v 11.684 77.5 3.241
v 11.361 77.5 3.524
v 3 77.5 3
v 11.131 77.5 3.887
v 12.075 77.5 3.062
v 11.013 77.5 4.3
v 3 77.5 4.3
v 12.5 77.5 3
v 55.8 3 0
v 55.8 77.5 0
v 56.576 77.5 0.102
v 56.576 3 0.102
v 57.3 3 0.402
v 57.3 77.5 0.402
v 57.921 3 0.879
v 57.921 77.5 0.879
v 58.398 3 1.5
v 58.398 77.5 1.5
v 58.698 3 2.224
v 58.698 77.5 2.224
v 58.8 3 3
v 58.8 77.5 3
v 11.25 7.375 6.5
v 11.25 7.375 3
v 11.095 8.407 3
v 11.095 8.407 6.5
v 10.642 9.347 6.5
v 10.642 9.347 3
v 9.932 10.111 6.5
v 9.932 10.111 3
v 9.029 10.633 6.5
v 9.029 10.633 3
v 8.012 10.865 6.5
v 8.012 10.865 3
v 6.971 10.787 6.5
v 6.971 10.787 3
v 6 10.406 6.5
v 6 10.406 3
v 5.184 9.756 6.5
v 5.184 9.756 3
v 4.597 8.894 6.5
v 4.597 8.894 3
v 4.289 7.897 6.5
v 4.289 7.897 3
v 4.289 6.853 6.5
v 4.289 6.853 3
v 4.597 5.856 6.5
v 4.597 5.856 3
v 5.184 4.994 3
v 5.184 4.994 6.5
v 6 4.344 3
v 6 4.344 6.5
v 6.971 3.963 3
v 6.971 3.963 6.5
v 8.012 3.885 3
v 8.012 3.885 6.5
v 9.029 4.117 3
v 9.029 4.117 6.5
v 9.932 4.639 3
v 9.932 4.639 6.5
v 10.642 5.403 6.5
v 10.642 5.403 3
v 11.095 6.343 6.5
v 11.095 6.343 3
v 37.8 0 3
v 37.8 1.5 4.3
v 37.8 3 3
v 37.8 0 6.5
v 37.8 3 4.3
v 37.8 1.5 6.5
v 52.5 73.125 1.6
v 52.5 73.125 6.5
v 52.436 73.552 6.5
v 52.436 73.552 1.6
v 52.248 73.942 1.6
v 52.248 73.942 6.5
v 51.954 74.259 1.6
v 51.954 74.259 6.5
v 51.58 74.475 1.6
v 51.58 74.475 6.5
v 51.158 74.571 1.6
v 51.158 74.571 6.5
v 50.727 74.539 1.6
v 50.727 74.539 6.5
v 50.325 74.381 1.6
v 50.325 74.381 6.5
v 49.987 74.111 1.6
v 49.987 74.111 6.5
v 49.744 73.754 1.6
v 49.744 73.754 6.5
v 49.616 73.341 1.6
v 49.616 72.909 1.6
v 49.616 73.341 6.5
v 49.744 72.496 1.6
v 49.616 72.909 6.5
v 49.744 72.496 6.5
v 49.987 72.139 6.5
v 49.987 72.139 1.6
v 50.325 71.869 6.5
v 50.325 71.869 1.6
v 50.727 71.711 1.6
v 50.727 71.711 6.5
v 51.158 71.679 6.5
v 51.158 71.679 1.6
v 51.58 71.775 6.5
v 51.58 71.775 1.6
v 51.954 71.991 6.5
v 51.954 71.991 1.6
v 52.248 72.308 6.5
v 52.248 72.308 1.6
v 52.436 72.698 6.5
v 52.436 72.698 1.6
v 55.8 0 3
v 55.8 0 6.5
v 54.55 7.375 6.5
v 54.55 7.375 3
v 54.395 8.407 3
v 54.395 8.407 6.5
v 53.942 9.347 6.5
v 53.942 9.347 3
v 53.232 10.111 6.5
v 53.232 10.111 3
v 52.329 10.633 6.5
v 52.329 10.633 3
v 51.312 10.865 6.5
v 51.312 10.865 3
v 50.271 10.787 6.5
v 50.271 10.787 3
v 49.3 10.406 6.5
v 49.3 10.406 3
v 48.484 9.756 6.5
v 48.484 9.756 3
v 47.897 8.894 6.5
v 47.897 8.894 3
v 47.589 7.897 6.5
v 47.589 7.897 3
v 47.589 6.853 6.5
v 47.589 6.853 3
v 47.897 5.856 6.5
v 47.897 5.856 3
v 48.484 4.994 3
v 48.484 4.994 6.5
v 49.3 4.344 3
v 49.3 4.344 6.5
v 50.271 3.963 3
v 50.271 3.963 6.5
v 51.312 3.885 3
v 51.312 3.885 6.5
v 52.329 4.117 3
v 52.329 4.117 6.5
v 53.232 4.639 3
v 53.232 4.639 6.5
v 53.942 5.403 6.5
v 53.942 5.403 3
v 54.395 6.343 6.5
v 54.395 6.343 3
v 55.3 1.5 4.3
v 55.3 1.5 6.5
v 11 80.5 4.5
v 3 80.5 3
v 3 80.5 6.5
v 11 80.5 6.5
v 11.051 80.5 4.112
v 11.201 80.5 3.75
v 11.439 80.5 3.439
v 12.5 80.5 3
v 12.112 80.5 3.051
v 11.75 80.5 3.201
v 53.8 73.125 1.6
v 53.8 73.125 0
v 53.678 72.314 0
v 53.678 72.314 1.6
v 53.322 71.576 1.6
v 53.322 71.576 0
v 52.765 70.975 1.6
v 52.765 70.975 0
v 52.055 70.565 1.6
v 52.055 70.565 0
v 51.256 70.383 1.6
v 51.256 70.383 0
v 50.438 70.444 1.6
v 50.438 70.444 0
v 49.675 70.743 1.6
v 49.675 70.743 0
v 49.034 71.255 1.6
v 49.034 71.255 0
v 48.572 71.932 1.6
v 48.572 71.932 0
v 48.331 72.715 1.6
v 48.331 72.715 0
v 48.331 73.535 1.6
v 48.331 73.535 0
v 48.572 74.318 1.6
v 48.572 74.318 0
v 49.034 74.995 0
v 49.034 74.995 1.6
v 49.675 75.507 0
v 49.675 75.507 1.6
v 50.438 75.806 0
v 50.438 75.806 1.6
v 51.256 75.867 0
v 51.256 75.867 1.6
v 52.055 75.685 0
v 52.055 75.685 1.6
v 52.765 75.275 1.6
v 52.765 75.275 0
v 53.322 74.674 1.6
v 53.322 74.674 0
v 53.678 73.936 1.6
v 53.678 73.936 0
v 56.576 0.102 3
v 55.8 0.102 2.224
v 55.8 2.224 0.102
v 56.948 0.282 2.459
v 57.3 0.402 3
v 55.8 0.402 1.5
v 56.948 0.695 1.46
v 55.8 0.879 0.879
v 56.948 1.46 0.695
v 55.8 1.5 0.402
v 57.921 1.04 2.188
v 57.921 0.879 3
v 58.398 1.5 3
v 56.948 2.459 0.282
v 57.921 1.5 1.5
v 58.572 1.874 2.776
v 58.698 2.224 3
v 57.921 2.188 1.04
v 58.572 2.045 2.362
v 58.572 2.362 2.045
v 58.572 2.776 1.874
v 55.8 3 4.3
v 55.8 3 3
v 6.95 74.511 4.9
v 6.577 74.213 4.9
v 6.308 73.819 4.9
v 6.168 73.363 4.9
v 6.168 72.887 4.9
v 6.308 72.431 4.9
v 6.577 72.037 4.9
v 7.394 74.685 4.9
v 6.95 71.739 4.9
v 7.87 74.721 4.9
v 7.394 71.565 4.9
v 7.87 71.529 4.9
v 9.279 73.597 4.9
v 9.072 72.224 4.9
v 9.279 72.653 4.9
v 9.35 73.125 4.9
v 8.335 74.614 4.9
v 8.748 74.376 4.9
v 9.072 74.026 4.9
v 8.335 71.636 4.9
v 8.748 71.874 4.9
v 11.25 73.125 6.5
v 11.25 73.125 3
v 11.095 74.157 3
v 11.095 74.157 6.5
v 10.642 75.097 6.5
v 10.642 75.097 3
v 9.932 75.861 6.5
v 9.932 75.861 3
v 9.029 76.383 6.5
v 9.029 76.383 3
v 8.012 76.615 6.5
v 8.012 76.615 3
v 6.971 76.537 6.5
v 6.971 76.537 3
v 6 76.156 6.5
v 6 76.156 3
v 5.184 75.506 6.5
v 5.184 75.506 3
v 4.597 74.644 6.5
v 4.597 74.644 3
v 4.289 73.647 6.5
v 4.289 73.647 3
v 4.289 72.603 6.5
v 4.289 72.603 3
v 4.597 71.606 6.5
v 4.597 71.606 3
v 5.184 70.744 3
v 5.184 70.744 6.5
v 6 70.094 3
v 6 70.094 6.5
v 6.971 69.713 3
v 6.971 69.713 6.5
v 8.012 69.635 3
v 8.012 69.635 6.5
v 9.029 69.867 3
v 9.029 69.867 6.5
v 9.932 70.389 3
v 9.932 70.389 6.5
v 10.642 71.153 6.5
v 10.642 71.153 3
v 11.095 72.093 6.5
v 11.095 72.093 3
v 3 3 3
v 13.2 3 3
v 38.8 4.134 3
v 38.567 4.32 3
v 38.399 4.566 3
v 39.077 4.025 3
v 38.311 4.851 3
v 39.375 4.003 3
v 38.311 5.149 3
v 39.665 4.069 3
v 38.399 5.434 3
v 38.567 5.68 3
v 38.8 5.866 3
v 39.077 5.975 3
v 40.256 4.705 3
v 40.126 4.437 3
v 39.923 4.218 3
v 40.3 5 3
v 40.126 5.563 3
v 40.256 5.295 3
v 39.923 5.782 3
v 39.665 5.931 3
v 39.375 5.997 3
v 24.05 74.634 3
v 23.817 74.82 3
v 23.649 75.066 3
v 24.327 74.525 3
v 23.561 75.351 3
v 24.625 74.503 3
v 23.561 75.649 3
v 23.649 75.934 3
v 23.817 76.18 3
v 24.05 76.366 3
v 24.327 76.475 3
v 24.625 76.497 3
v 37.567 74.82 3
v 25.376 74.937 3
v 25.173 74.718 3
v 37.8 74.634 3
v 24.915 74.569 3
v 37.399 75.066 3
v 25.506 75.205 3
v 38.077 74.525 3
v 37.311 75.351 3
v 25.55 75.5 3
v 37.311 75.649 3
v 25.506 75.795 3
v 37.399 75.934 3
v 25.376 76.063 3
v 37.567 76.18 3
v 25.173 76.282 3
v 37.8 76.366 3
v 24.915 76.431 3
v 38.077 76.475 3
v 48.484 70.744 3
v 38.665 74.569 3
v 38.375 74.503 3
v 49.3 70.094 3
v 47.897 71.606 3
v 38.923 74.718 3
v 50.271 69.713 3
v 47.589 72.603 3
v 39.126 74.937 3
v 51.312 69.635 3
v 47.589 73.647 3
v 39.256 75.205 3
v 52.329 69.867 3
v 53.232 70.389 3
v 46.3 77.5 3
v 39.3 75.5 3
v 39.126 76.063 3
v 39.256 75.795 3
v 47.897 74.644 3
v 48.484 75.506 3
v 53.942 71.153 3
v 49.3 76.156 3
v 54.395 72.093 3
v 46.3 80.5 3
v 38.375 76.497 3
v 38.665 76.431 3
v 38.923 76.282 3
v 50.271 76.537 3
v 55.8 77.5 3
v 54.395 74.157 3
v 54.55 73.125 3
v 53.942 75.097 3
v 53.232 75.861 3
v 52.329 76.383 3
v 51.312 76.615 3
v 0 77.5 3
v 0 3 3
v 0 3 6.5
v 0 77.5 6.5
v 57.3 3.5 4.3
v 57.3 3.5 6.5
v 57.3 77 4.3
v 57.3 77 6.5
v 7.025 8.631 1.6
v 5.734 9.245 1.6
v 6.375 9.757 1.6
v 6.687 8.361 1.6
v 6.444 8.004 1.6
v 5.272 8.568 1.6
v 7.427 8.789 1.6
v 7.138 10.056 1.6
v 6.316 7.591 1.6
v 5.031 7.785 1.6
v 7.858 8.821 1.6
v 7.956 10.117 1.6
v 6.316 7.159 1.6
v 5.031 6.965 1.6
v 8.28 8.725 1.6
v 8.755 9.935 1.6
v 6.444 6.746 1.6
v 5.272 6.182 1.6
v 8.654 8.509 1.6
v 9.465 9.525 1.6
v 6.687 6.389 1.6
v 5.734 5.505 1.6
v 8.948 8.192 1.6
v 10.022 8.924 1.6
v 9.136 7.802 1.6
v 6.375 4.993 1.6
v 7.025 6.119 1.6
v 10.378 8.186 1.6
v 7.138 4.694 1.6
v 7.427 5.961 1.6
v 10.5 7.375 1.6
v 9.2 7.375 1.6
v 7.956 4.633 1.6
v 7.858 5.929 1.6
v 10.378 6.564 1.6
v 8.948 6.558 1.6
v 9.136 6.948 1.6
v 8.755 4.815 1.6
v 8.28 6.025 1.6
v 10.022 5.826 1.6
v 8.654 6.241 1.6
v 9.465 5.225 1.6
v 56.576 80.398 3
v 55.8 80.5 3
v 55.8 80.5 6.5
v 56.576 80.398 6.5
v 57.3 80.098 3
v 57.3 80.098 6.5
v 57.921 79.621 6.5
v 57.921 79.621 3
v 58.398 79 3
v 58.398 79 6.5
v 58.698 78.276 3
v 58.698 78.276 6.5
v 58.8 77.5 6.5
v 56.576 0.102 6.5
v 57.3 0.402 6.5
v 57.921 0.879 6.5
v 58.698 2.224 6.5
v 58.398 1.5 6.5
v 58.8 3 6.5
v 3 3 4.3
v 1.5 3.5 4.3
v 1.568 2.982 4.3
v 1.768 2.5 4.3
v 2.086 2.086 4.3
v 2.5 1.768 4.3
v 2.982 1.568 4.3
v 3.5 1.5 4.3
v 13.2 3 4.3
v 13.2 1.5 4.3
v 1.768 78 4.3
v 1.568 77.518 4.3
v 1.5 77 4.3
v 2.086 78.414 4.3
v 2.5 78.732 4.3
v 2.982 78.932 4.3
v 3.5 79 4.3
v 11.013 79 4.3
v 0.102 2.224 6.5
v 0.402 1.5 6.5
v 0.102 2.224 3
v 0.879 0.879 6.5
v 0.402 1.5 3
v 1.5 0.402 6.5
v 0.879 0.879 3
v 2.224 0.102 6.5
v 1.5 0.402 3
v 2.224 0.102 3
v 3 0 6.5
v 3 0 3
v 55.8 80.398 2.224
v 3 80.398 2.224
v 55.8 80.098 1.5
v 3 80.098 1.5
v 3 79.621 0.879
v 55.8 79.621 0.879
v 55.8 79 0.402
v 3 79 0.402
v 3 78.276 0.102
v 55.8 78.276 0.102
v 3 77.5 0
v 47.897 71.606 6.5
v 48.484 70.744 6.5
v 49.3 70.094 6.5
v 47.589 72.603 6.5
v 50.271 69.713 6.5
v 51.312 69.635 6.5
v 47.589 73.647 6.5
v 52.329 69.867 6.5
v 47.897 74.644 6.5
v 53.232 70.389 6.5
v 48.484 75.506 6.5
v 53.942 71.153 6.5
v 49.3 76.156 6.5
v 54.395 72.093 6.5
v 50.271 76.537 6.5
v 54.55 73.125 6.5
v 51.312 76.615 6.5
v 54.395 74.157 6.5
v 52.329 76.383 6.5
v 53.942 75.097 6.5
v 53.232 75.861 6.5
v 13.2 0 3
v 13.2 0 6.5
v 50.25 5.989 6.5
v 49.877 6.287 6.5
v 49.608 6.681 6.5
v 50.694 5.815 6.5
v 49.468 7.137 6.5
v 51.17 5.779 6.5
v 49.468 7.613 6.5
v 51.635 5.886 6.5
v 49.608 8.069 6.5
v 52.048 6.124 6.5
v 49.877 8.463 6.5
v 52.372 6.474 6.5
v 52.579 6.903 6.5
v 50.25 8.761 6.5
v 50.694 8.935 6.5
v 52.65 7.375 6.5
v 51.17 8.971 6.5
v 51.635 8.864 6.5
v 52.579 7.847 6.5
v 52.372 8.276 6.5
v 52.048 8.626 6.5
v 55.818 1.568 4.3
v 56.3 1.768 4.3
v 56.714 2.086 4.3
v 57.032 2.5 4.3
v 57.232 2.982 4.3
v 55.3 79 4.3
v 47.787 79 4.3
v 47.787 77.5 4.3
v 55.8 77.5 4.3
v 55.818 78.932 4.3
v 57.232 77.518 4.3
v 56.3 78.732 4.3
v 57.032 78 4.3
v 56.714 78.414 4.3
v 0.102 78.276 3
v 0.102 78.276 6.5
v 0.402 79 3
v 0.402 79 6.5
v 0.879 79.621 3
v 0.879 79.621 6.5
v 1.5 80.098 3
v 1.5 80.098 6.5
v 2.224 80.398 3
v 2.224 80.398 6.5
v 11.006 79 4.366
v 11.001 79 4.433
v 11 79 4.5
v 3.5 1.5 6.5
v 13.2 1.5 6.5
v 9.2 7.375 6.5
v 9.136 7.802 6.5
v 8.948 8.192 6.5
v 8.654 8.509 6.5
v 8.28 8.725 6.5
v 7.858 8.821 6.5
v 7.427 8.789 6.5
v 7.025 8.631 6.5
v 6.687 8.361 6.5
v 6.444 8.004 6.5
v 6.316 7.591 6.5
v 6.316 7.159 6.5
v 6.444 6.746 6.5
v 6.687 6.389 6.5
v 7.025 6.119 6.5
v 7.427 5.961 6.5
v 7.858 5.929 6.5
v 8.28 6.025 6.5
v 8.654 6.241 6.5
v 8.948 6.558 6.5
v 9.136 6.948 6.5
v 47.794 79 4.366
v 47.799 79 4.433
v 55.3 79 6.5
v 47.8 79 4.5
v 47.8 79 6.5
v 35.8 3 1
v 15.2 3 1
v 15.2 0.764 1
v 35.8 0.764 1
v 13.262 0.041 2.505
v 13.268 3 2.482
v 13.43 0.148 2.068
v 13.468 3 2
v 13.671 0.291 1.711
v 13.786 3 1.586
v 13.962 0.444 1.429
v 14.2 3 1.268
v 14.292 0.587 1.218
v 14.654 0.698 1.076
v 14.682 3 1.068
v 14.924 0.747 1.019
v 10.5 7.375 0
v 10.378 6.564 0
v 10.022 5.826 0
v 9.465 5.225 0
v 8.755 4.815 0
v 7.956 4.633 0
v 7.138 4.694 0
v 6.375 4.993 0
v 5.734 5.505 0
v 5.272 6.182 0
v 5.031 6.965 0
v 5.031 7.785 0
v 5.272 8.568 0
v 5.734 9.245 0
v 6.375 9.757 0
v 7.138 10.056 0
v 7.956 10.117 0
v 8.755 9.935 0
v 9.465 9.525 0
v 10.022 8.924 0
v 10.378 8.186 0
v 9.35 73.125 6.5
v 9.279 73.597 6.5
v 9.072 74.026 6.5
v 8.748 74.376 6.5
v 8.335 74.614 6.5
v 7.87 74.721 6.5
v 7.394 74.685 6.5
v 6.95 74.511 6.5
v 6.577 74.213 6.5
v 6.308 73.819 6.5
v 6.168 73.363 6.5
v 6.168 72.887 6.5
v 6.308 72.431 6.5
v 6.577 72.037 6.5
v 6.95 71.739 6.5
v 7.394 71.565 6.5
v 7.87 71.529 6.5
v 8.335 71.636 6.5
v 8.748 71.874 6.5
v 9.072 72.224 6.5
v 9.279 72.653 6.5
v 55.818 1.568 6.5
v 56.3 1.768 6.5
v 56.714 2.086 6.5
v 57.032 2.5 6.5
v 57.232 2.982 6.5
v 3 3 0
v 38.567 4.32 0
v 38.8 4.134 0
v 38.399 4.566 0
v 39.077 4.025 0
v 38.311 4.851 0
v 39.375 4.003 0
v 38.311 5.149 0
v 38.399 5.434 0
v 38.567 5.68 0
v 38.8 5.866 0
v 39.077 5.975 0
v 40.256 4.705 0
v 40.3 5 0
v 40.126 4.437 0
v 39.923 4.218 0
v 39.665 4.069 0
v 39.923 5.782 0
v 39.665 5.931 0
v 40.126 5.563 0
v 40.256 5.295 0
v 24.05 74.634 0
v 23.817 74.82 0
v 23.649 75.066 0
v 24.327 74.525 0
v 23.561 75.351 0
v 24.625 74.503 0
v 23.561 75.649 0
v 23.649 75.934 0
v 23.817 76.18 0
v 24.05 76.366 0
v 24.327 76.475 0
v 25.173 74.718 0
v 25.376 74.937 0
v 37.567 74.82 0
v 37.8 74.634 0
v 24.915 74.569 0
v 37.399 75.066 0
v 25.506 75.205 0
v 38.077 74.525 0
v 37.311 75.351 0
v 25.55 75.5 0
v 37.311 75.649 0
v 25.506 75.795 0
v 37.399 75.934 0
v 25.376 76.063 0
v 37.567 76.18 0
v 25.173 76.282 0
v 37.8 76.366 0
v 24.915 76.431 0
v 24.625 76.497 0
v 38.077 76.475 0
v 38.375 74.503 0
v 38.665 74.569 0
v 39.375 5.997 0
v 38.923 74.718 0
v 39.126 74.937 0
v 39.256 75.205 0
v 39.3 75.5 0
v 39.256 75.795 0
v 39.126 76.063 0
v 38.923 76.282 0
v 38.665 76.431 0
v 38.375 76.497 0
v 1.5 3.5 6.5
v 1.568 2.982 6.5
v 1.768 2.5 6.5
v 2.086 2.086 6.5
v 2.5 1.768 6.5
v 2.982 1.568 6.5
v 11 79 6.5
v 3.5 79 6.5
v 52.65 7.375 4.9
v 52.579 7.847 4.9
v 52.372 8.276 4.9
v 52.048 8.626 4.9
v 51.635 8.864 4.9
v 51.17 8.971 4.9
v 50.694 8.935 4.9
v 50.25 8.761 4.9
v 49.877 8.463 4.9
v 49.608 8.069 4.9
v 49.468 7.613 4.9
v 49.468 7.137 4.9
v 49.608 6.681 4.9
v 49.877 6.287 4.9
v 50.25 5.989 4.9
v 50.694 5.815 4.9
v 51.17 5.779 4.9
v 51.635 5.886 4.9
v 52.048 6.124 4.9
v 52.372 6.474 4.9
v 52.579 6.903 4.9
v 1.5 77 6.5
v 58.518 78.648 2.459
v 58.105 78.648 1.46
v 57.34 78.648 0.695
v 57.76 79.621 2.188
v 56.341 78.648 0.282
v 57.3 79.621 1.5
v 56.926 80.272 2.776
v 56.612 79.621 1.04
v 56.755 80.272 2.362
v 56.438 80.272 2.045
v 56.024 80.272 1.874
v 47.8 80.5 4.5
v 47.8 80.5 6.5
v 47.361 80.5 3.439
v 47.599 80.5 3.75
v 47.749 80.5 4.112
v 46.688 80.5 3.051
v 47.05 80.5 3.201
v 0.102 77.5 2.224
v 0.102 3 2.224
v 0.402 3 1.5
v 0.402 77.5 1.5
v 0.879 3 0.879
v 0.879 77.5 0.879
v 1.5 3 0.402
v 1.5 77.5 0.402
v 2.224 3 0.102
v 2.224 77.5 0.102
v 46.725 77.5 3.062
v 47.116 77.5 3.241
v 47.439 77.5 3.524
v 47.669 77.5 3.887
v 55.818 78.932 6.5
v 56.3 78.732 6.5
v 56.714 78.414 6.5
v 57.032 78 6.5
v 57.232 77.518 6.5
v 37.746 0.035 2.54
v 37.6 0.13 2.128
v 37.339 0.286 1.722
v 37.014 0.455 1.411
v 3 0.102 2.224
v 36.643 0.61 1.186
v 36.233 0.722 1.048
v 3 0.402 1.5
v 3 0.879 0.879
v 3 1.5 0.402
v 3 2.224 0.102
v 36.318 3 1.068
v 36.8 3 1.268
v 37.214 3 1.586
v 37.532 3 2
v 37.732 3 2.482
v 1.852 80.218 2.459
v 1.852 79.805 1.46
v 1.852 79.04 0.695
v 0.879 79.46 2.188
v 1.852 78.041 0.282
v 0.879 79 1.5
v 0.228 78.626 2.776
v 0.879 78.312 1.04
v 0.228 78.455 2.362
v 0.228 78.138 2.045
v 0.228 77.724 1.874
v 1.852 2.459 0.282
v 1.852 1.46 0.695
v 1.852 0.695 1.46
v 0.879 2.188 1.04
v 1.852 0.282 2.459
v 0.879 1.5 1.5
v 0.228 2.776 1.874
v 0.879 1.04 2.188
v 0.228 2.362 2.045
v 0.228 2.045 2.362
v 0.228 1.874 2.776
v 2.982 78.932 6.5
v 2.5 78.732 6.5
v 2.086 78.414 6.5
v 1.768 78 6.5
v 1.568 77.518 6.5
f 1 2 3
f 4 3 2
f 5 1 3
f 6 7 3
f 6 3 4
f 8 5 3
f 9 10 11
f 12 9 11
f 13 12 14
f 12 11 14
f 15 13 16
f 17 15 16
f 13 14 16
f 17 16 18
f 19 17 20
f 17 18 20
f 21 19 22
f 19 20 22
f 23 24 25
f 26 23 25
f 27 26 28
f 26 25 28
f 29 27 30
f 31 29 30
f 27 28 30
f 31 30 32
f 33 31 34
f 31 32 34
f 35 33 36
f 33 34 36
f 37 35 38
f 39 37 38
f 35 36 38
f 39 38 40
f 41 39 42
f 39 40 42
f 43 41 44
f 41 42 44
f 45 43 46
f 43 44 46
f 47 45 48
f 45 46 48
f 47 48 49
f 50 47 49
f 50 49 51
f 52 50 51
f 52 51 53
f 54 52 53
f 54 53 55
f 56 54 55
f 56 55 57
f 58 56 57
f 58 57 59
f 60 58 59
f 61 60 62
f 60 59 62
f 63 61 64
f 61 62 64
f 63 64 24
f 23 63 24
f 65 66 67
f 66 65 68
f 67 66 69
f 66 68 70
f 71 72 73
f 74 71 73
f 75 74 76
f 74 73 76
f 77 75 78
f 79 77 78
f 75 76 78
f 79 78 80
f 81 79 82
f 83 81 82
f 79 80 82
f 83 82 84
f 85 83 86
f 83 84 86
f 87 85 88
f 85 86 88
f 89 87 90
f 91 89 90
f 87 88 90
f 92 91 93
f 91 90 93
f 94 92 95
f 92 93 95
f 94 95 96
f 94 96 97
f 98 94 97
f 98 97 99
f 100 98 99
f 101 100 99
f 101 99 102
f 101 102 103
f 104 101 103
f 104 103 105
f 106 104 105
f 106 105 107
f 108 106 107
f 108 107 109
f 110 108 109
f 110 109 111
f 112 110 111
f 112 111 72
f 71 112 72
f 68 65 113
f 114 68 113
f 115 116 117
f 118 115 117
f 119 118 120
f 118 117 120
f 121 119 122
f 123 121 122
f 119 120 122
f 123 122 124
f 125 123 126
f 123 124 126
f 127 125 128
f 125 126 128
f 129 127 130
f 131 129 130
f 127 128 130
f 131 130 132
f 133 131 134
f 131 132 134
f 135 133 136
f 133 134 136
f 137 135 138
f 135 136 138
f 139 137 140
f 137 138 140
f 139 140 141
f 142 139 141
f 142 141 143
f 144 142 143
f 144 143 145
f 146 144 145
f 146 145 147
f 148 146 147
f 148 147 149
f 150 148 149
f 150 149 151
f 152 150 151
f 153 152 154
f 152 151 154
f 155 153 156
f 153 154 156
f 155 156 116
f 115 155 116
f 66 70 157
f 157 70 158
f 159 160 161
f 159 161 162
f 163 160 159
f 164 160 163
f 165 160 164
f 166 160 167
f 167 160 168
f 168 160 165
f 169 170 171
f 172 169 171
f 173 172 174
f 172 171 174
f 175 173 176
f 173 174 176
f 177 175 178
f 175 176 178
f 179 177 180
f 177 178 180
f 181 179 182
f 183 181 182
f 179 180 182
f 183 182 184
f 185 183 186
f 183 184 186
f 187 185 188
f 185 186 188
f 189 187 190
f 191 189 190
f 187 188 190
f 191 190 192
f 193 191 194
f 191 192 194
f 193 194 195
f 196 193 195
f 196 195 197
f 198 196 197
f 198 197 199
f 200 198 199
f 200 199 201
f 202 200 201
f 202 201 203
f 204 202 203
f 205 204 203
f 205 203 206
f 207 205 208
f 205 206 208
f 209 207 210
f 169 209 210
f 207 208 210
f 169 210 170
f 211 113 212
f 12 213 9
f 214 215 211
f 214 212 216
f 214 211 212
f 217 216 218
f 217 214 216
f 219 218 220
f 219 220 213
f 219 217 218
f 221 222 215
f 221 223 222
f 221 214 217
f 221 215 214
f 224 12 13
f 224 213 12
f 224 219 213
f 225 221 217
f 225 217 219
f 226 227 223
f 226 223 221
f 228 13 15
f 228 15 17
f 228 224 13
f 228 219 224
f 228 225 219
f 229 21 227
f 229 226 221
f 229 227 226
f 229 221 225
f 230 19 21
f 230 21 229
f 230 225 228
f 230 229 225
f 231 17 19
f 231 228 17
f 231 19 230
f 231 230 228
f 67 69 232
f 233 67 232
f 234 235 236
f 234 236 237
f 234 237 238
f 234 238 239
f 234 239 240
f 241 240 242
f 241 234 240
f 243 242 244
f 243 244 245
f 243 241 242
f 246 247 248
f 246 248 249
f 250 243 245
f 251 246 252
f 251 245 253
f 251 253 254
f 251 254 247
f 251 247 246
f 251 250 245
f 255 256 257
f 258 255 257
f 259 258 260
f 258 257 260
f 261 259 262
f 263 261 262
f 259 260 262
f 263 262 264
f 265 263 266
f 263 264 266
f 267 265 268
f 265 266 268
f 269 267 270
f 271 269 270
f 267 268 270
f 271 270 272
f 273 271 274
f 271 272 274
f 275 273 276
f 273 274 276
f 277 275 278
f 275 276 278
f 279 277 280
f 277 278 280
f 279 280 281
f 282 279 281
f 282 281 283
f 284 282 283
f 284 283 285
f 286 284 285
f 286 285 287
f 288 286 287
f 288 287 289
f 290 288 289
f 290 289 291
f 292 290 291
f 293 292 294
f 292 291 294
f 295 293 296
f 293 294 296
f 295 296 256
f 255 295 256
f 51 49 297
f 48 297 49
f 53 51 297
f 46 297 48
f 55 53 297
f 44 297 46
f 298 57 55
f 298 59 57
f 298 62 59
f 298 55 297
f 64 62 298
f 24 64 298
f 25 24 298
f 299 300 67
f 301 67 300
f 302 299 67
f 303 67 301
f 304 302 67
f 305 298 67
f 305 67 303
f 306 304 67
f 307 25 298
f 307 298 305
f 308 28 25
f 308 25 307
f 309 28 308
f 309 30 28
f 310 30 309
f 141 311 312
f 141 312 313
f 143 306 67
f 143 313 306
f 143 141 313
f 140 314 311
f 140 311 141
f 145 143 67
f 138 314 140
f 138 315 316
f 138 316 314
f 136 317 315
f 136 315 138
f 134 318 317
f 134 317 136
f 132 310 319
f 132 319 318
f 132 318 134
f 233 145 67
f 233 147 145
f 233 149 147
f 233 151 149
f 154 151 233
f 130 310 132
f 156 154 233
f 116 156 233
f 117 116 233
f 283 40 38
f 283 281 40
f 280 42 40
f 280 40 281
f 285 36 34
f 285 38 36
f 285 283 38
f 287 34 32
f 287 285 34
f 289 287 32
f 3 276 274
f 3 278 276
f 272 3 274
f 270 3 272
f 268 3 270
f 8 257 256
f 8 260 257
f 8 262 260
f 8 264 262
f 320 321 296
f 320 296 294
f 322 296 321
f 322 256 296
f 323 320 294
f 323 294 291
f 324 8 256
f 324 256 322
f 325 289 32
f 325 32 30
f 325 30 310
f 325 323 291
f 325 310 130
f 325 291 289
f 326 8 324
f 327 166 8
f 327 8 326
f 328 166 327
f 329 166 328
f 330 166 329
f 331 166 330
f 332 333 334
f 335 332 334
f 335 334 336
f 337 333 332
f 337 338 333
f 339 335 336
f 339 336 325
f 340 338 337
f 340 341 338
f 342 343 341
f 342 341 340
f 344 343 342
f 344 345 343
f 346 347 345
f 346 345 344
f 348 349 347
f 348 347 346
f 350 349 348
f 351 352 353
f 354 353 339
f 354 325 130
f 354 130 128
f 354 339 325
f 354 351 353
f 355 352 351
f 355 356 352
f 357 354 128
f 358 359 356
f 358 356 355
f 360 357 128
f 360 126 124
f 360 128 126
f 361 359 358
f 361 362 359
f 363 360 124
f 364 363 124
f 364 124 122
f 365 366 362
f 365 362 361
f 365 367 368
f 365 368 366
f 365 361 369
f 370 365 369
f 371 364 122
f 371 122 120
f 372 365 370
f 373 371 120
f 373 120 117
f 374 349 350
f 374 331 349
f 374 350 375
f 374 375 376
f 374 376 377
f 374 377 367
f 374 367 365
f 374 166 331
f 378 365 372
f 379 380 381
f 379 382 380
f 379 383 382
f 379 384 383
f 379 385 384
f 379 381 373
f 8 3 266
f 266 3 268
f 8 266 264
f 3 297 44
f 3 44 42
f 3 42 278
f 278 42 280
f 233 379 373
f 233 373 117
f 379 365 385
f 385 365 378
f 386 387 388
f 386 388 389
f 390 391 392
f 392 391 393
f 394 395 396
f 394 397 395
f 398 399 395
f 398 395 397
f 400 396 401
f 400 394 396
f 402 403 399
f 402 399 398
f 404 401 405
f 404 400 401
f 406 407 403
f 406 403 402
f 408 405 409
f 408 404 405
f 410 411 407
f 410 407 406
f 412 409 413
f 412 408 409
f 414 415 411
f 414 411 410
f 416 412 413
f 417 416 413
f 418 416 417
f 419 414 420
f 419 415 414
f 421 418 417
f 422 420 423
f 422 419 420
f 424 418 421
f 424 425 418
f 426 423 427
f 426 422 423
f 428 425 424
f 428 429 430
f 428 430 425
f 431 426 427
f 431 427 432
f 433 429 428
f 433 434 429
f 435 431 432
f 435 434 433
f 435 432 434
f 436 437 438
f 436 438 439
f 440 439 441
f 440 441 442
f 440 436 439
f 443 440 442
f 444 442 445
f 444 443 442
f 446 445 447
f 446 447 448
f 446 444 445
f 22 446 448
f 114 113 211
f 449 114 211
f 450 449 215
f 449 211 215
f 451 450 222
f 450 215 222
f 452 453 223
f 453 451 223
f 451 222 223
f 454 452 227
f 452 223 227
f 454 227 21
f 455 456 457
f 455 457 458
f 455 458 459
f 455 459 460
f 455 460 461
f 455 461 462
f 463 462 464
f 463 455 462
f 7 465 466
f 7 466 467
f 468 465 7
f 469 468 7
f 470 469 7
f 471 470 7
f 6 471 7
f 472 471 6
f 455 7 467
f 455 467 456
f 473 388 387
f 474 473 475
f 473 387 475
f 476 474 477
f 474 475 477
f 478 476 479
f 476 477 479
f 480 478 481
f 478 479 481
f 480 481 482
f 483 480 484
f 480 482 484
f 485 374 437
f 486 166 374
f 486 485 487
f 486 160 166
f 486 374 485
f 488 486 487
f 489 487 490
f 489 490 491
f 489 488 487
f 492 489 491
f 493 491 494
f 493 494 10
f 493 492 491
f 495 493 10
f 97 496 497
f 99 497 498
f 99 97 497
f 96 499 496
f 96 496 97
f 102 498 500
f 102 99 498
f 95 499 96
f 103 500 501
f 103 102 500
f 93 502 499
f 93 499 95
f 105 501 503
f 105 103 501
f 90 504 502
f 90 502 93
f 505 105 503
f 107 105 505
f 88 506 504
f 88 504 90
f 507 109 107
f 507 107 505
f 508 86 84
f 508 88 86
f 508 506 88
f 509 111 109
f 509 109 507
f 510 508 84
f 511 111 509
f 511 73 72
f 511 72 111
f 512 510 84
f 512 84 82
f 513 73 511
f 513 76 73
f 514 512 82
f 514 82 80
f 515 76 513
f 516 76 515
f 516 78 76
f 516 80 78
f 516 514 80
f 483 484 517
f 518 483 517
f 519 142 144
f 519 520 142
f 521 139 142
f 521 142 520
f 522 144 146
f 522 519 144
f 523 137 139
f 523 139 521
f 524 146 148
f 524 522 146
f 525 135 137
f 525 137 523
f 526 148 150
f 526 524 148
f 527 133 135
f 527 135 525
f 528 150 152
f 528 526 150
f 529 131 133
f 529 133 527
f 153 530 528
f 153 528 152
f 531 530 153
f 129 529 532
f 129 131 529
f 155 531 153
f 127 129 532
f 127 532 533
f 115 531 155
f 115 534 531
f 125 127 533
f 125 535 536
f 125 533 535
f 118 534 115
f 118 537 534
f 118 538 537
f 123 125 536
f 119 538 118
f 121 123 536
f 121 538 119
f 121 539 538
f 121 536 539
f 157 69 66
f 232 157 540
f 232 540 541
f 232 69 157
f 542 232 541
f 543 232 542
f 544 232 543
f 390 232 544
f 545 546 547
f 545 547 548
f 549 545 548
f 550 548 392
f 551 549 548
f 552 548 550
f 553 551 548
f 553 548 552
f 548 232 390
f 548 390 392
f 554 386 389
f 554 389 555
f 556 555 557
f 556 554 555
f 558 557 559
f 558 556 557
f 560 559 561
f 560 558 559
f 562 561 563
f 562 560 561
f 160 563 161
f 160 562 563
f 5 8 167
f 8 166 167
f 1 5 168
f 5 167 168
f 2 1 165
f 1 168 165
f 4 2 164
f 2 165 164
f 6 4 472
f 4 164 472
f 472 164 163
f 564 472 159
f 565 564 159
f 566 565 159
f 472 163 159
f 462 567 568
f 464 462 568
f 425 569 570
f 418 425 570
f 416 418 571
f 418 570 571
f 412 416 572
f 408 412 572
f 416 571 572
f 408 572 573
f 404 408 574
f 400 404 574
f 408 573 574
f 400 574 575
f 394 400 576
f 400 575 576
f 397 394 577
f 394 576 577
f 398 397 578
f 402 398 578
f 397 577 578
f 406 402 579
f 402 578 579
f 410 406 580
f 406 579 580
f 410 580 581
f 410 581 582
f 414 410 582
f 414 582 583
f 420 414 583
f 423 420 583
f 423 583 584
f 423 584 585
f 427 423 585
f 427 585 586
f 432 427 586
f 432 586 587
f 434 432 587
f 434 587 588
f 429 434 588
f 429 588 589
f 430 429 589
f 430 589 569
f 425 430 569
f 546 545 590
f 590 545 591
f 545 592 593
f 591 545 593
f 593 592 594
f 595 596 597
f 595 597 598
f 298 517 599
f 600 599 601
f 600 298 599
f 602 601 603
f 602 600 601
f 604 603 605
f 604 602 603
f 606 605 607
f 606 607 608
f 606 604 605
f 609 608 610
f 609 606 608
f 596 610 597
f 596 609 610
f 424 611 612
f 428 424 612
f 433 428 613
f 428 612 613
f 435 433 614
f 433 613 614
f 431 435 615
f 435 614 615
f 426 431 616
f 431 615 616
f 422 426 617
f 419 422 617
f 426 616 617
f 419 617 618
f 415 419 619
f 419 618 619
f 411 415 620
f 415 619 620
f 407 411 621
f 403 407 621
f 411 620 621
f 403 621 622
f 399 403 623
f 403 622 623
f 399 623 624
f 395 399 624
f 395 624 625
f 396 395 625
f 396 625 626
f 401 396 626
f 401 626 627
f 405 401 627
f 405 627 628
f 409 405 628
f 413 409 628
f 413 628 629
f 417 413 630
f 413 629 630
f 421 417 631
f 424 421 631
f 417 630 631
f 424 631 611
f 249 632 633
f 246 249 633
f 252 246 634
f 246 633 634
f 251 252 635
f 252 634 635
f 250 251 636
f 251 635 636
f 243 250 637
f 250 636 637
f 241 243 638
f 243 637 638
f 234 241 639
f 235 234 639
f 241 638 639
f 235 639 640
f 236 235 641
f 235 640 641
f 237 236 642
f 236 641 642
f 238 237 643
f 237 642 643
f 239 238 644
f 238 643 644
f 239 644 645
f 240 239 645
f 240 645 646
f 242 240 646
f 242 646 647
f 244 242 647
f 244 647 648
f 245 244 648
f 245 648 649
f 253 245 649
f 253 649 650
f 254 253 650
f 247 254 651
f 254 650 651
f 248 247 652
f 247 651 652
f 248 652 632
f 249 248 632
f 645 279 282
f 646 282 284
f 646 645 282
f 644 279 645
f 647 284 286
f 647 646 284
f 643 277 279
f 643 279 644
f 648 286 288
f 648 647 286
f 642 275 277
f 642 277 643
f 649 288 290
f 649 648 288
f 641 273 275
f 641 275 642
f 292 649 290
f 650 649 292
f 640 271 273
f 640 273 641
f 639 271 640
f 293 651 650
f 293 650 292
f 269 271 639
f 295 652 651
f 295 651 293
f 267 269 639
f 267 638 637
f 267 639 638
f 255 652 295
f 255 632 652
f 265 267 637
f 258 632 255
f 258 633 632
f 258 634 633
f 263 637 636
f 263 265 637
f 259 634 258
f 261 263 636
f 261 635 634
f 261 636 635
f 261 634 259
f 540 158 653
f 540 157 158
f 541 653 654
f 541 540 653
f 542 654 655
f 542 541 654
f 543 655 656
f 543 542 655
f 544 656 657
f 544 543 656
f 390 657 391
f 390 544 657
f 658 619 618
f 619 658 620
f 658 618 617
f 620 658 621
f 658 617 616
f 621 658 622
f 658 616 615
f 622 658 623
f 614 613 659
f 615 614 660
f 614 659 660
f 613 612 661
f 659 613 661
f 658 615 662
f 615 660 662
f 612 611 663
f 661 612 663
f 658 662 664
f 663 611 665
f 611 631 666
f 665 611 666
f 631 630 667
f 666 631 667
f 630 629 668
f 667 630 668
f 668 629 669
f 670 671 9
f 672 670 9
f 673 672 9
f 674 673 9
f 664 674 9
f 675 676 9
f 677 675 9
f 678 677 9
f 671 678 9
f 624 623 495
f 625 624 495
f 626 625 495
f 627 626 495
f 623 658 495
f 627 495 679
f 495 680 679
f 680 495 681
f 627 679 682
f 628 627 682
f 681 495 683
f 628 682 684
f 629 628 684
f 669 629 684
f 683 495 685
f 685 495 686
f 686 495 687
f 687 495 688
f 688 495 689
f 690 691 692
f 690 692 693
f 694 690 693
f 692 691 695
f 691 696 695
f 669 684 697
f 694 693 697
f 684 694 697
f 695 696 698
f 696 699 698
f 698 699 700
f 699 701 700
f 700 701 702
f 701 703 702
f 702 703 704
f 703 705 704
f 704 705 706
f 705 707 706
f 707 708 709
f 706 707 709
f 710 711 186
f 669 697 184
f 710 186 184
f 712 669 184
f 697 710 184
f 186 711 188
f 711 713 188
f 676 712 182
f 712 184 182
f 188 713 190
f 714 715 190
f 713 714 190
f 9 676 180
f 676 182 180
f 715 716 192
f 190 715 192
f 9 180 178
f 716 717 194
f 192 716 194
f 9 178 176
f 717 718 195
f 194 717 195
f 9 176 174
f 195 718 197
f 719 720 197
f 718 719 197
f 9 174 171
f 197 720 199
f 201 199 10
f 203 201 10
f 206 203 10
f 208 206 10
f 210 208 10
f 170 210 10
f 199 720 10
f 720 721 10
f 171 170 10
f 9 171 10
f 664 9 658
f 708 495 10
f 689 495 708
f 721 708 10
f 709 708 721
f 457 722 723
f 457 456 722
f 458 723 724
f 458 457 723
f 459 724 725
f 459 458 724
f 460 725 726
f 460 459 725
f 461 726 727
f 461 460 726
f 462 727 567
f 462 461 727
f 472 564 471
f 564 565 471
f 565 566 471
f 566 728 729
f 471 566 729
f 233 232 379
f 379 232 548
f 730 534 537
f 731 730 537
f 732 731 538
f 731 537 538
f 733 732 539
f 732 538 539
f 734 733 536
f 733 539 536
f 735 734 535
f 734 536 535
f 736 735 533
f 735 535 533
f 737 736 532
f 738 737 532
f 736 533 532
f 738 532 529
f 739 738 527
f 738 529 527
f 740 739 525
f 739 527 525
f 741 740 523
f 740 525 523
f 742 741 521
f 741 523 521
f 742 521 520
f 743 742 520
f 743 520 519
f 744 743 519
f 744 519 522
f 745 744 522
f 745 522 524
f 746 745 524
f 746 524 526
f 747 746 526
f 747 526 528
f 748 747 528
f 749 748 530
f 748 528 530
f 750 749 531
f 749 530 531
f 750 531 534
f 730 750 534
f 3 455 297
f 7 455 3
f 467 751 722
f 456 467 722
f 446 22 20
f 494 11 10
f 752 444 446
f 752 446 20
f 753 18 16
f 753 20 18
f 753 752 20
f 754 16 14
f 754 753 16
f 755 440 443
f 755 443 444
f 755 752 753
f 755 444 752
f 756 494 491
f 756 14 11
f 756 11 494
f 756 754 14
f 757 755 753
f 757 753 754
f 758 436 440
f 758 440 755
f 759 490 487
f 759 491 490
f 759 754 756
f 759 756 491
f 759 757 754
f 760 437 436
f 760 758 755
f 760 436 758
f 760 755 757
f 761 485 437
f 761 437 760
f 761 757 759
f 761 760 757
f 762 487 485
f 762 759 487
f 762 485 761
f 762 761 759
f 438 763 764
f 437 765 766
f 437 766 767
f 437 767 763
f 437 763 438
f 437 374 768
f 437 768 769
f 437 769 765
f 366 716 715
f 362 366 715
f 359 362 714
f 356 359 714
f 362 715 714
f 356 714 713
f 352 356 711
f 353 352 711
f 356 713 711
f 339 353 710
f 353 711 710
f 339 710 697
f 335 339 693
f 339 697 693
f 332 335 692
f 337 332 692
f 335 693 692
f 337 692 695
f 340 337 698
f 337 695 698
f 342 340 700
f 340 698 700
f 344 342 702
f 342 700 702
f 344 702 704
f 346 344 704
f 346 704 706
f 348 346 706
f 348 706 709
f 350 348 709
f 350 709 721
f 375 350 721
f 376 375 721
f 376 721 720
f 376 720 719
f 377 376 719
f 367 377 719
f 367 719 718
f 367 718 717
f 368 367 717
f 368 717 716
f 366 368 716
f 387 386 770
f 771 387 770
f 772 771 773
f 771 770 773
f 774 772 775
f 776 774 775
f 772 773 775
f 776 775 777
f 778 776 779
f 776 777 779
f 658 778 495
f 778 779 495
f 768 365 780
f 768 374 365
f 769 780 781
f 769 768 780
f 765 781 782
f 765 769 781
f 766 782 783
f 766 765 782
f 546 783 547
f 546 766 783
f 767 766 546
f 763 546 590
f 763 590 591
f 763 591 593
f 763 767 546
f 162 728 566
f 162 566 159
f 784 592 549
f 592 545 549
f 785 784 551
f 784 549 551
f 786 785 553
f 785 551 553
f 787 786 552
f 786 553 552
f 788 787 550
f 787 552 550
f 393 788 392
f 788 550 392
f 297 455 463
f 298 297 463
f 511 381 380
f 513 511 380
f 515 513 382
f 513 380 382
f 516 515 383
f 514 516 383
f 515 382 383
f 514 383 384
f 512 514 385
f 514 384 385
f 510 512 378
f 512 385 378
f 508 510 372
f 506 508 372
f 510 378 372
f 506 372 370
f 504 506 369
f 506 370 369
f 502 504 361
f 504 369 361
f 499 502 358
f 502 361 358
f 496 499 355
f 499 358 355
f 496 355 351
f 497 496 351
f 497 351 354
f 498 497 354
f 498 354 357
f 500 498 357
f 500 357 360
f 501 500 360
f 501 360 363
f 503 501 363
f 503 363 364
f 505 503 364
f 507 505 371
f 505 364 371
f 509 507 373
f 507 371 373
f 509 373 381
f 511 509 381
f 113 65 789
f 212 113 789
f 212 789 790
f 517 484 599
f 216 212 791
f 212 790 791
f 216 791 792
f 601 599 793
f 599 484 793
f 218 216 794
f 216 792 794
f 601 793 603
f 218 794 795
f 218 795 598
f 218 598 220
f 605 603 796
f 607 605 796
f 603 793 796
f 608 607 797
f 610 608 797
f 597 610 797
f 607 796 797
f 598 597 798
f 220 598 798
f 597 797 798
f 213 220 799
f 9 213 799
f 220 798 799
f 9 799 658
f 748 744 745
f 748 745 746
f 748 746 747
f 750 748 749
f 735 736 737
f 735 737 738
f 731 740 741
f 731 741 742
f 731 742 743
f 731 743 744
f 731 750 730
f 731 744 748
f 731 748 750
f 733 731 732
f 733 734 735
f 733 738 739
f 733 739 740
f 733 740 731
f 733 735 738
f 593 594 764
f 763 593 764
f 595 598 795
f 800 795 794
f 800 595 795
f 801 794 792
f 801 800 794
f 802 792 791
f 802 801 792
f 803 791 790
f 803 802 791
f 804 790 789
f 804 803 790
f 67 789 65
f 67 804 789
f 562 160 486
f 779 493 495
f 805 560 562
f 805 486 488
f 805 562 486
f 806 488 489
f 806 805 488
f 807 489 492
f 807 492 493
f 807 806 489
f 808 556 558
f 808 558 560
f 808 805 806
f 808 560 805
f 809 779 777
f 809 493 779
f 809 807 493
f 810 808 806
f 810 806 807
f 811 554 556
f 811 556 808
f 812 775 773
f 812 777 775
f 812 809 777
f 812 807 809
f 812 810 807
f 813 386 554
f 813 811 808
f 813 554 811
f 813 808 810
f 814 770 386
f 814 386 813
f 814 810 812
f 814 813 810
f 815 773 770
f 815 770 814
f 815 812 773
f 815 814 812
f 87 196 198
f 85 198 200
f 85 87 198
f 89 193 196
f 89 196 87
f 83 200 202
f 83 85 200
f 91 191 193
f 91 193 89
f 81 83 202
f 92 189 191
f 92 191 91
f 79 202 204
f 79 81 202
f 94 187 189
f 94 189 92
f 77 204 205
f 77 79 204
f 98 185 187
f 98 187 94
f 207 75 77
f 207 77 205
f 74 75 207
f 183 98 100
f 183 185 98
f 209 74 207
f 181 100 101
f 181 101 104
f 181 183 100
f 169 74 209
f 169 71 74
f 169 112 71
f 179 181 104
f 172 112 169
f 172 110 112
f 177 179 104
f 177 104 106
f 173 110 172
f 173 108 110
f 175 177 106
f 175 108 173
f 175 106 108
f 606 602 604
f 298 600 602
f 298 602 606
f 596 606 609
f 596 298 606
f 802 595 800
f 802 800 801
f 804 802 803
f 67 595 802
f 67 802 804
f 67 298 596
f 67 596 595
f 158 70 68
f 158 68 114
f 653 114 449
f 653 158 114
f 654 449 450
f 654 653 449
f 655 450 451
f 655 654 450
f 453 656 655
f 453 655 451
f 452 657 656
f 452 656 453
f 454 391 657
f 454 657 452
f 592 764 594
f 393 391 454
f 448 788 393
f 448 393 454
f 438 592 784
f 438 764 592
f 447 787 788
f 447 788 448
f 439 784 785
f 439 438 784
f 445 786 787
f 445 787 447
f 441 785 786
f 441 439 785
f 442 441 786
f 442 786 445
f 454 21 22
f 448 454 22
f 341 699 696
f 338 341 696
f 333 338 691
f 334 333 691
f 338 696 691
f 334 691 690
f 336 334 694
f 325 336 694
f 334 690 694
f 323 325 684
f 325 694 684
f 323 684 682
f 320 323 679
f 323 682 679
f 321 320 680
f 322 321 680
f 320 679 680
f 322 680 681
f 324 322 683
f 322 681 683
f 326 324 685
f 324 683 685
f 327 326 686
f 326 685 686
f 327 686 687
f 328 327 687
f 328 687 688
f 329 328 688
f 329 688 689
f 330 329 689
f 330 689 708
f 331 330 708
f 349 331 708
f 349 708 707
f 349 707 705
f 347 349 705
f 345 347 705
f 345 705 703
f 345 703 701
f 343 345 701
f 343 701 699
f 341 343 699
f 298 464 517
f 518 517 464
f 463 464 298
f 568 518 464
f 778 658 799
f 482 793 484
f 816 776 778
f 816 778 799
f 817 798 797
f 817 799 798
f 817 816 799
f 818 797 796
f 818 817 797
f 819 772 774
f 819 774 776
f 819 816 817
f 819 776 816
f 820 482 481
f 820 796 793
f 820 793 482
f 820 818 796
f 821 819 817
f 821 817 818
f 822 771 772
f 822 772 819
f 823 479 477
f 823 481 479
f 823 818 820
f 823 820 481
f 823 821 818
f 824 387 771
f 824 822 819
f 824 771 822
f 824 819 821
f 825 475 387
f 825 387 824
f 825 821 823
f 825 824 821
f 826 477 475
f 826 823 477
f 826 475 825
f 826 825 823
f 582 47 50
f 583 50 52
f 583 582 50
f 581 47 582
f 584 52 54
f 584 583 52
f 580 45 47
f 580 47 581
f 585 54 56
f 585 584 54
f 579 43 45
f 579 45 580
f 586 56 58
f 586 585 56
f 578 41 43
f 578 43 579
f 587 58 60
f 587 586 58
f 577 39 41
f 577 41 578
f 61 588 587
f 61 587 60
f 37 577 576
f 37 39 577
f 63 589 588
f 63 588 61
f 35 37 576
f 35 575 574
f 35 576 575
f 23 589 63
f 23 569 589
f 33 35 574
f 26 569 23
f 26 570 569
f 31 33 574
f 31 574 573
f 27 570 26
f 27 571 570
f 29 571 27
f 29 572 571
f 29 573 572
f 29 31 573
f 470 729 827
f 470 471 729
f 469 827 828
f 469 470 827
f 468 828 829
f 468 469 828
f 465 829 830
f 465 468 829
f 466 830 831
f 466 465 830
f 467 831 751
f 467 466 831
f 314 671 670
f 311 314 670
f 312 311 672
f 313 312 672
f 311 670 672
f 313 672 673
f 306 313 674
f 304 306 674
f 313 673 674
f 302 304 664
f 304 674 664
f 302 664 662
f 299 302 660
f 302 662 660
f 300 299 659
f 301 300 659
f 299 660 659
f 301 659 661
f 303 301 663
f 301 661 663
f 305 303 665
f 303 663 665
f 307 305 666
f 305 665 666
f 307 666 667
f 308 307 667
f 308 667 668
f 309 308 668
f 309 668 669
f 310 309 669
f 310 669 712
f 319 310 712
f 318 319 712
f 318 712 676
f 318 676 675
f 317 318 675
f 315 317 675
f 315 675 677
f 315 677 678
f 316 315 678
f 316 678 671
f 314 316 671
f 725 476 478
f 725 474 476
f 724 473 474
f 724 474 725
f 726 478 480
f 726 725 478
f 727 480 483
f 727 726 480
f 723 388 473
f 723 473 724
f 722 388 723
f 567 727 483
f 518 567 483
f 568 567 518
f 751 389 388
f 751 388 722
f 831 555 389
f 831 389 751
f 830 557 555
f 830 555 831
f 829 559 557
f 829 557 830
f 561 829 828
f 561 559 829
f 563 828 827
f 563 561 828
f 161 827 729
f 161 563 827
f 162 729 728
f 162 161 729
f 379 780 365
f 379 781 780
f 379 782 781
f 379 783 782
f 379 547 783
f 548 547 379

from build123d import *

# Parameters (mm, degrees)
F0_W          = 58.8
F0_H          = 80.5
F1_DEPTH      = 6.5
F2_W          = 52.8
F2_H          = 74.5
F3_DEPTH      = 3.5
F5_R          = 3.5
F6_DEPTH      = 3.5
F8_R          = 1.45
F10_R         = 1.45
F11_DEPTH     = 6.501
F9_R          = 1.6
F7_R          = 1.6
F12_DEPTH     = 1.6
F13_W         = 36.8
F13_H         = 3
F14_DEPTH     = 3.5
F15_W         = 24.6
F15_H         = 3
F16_DEPTH     = 5.5
F19_DEPTH     = 2.2
F20_R         = 1
F21_DEPTH     = 6.501
F22_T1_DEPTH  = 11
F22_T3_DEPTH  = 52.8
F22_T5_DEPTH  = 74.5
F22_S9_W      = 3
F22_S9_H      = 3
F22_T10_DEPTH = 3
F22_S15_W     = 3
F22_S15_H     = 3
F22_T16_DEPTH = 3
F22_S21_W     = 3
F22_S21_H     = 3
F22_T22_DEPTH = 3
F22_S27_W     = 3
F22_S27_H     = 3
F22_T28_DEPTH = 3
F24_R         = 2
F25_R         = 1.5
F26_R         = 2
F27_R         = 2.75
F28_DEPTH     = 1.6


# Not quite as in the source:
# - a fillet or chamfer that OpenCascade refuses, or shapes differently, is made with other operations: its cross-section is extruded or revolved along the edge and cut away or added
# - a feature of the source that left no trace in its solid (it failed there, or was rolled back) is left out


with BuildPart() as f1:
    # F0 (on Top) → F1 (new body)
    with BuildSketch(Plane.XY):
        with Locations((29.4, 40.25)):
            Rectangle(F0_W, F0_H)
    extrude(amount=F1_DEPTH)

    # F2 (on face) → F3 (cut)
    with BuildSketch(Plane.XY.offset(6.5)):
        with Locations((29.4, 40.25)):
            Rectangle(F2_W, F2_H)
    extrude(amount=-F3_DEPTH, mode=Mode.SUBTRACT)

    # F5 (on face) → F6 (join)
    with BuildSketch(Plane.XY.offset(3)):
        with Locations((7.75, 7.375)):
            Circle(F5_R)
        with Locations((7.75, 73.125)):
            Circle(F5_R)
        with Locations((51.05, 73.125)):
            Circle(F5_R)
        with Locations((51.05, 7.375)):
            Circle(F5_R)
    extrude(amount=F6_DEPTH)

    # F8 (on face) + F10 (on face) → F11 (cut, through all)
    with BuildSketch(Plane.XY.offset(6.5)):
        with Locations((51.05, 73.125)):
            Circle(F8_R)
    with BuildSketch(Plane.XY.offset(6.5)):
        with Locations((7.75, 7.375)):
            Circle(F10_R)
    extrude(amount=-F11_DEPTH, mode=Mode.SUBTRACT)

    # F9 (on face) + F7 (on face) → F12 (cut)
    with BuildSketch(Plane.XY.offset(6.5)):
        with Locations((7.75, 73.125)):
            Circle(F9_R)
    with BuildSketch(Plane.XY.offset(6.5)):
        with Locations((51.05, 7.375)):
            Circle(F7_R)
    extrude(amount=-F12_DEPTH, mode=Mode.SUBTRACT)

    # F13 (on face) → F14 (cut)
    with BuildSketch(Plane.XY.offset(6.5)):
        with Locations((29.4, 79)):
            Rectangle(F13_W, F13_H)
    extrude(amount=-F14_DEPTH, mode=Mode.SUBTRACT)

    # F15 (on face) → F16 (cut)
    with BuildSketch(Plane.XY.offset(6.5)):
        with Locations((25.5, 1.5)):
            Rectangle(F15_W, F15_H)
    extrude(amount=-F16_DEPTH, mode=Mode.SUBTRACT)

    # F17 (on face) + F18 (on face) → F19 (cut)
    with BuildSketch(Plane.XY.offset(6.5)):
        Polygon((47.8, 79), (47.8, 77.5), (55.8, 77.5), (55.8, 3), (37.8, 3), (37.8, 1.5), (57.3, 1.5), (57.3, 79), align=None)
    with BuildSketch(Plane.XY.offset(6.5)):
        Polygon((1.5, 1.5), (13.2, 1.5), (13.2, 3), (3, 3), (3, 77.5), (11, 77.5), (11, 79), (1.5, 79), align=None)
    extrude(amount=-F19_DEPTH, mode=Mode.SUBTRACT)

    # F20 (on face) → F21 (cut, through all)
    with BuildSketch(Plane(origin=(0, 0, 0), x_dir=(1, 0, 0), z_dir=(0, 0, -1))):
        with Locations((39.3, -5)):
            Circle(F20_R)
        with Locations((38.3, -75.5)):
            Circle(F20_R)
        with Locations((24.55, -75.5)):
            Circle(F20_R)
    extrude(amount=-F21_DEPTH, mode=Mode.SUBTRACT)

    # F22: fillet of radius 3 on 8 edges, made by hand

    # F22_s2 → F22_t1 (cut)
    with BuildSketch(Plane.XY.offset(3)):
        with BuildLine():
            ThreePointArc((0, 3), (0.8786796564, 0.8786796564), (3, 0))
            Line((3, 0), (0, 0))
            Line((0, 0), (0, 3))
        make_face()
        with BuildLine():
            ThreePointArc((55.8, 0), (57.9213203436, 0.8786796564), (58.8, 3))
            Line((58.8, 3), (58.8, 0))
            Line((58.8, 0), (55.8, 0))
        make_face()
        with BuildLine():
            ThreePointArc((0, 77.5), (0.8786796564, 79.6213203436), (3, 80.5))
            Line((3, 80.5), (0, 80.5))
            Line((0, 80.5), (0, 77.5))
        make_face()
        with BuildLine():
            ThreePointArc((55.8, 80.5), (57.9213203436, 79.6213203436), (58.8, 77.5))
            Line((58.8, 77.5), (58.8, 80.5))
            Line((58.8, 80.5), (55.8, 80.5))
        make_face()
    extrude(amount=F22_T1_DEPTH, mode=Mode.SUBTRACT)

    # F22_s4 → F22_t3 (cut)
    with BuildSketch(Plane.YZ.offset(3)):
        with BuildLine():
            ThreePointArc((0, 3), (0.8786796564, 0.8786796564), (3, 0))
            Line((3, 0), (0, 0))
            Line((0, 0), (0, 3))
        make_face()
        with BuildLine():
            ThreePointArc((80.5, 3), (79.6213203436, 0.8786796564), (77.5, 0))
            Line((77.5, 0), (80.5, 0))
            Line((80.5, 0), (80.5, 3))
        make_face()
    extrude(amount=F22_T3_DEPTH, mode=Mode.SUBTRACT)

    # F22_s6 → F22_t5 (cut)
    with BuildSketch(Plane.XZ.offset(-77.5)):
        with BuildLine():
            ThreePointArc((0, 3), (0.8786796564, 0.8786796564), (3, 0))
            Line((3, 0), (0, 0))
            Line((0, 0), (0, 3))
        make_face()
        with BuildLine():
            ThreePointArc((55.8, 0), (57.9213203436, 0.8786796564), (58.8, 3))
            Line((58.8, 3), (58.8, 0))
            Line((58.8, 0), (55.8, 0))
        make_face()
    extrude(amount=F22_T5_DEPTH, mode=Mode.SUBTRACT)


with BuildPart() as f22_tool8:
    # F22_s9 → F22_t10 (new body)
    with BuildSketch(Plane.YZ.offset(3)):
        with Locations((1.5, 1.5)):
            Rectangle(F22_S9_W, F22_S9_H)
    extrude(amount=-F22_T10_DEPTH)

    # F22_s11 → F22_t12 (revolve, cut)
    with BuildSketch(Plane(origin=(3, 3, 3), x_dir=(0, 0.7071067812, 0.7071067812), z_dir=(0, -0.7071067812, 0.7071067812))):
        with BuildLine():
            ThreePointArc((0, -3), (3, 0), (0, 3))
            Line((0, 3), (0, -3))
        make_face()
    revolve(axis=Axis((3, 3, 3), (-1, 0, 0)), mode=Mode.SUBTRACT)


with BuildPart() as f1_1:
    add(f1.part)

    # F22_t7: cut F22_tool8
    add(f22_tool8.part, mode=Mode.SUBTRACT)


with BuildPart() as f22_tool14:
    # F22_s15 → F22_t16 (new body)
    with BuildSketch(Plane.YZ.offset(55.8)):
        with Locations((1.5, 1.5)):
            Rectangle(F22_S15_W, F22_S15_H)
    extrude(amount=F22_T16_DEPTH)

    # F22_s17 → F22_t18 (revolve, cut)
    with BuildSketch(Plane(origin=(55.8, 3, 3), x_dir=(0, 0.7071067812, 0.7071067812), z_dir=(0, 0.7071067812, -0.7071067812))):
        with BuildLine():
            ThreePointArc((0, -3), (3, 0), (0, 3))
            Line((0, 3), (0, -3))
        make_face()
    revolve(axis=Axis((55.8, 3, 3), (1, 0, 0)), mode=Mode.SUBTRACT)


with BuildPart() as f1_2:
    add(f1_1.part)

    # F22_t13: cut F22_tool14
    add(f22_tool14.part, mode=Mode.SUBTRACT)


with BuildPart() as f22_tool20:
    # F22_s21 → F22_t22 (new body)
    with BuildSketch(Plane.YZ.offset(3)):
        with Locations((79, 1.5)):
            Rectangle(F22_S21_W, F22_S21_H)
    extrude(amount=-F22_T22_DEPTH)

    # F22_s23 → F22_t24 (revolve, cut)
    with BuildSketch(Plane(origin=(3, 77.5, 3), x_dir=(0, -0.7071067812, 0.7071067812), z_dir=(0, -0.7071067812, -0.7071067812))):
        with BuildLine():
            ThreePointArc((0, -3), (3, 0), (0, 3))
            Line((0, 3), (0, -3))
        make_face()
    revolve(axis=Axis((3, 77.5, 3), (-1, 0, 0)), mode=Mode.SUBTRACT)


with BuildPart() as f1_3:
    add(f1_2.part)

    # F22_t19: cut F22_tool20
    add(f22_tool20.part, mode=Mode.SUBTRACT)


with BuildPart() as f22_tool26:
    # F22_s27 → F22_t28 (new body)
    with BuildSketch(Plane.XZ.offset(-77.5)):
        with Locations((57.3, 1.5)):
            Rectangle(F22_S27_W, F22_S27_H)
    extrude(amount=-F22_T28_DEPTH)

    # F22_s29 → F22_t30 (revolve, cut)
    with BuildSketch(Plane(origin=(55.8, 77.5, 3), x_dir=(-0.7071067812, 0, 0.7071067812), z_dir=(-0.7071067812, 0, -0.7071067812))):
        with BuildLine():
            ThreePointArc((0, -3), (3, 0), (0, 3))
            Line((0, 3), (0, -3))
        make_face()
    revolve(axis=Axis((55.8, 77.5, 3), (0, 1, 0)), mode=Mode.SUBTRACT)


with BuildPart() as f1_4:
    add(f1_3.part)

    # F22_t25: cut F22_tool26
    add(f22_tool26.part, mode=Mode.SUBTRACT)

    # F24
    f24_edges = [f1_4.edges().sort_by_distance(p)[0] for p in [
        (57.3, 79, 5.4),
        (57.3, 1.5, 5.4),
        (1.5, 1.5, 5.4),
        (1.5, 79, 5.4),
    ]]
    fillet(f24_edges, radius=F24_R)

    # F25#2 (call 1 of 2: OpenCascade refuses the feature's edges together)
    f25_2_edges = [f1_4.edges().sort_by_distance(p)[0] for p in [
        (47.8, 79, 3),
    ]]
    fillet(f25_2_edges, radius=F25_R)

    # F25 (call 2 of 2)
    f25_edges = [f1_4.edges().sort_by_distance(p)[0] for p in [
        (11, 79, 3),
    ]]
    fillet(f25_edges, radius=F25_R)

    # F26
    f26_edges = [f1_4.edges().sort_by_distance(p)[0] for p in [
        (13.2, 1.881966, 1),
        (37.8, 1.881966, 1),
    ]]
    fillet(f26_edges, radius=F26_R)

    # F27 (on face) → F28 (cut)
    with BuildSketch(Plane(origin=(0, 0, 0), x_dir=(1, 0, 0), z_dir=(0, 0, -1))):
        with Locations((51.05, -73.125)):
            Circle(F27_R)
        with Locations((7.75, -7.375)):
            Circle(F27_R)
    extrude(amount=-F28_DEPTH, mode=Mode.SUBTRACT)


solid = f1_4.part
